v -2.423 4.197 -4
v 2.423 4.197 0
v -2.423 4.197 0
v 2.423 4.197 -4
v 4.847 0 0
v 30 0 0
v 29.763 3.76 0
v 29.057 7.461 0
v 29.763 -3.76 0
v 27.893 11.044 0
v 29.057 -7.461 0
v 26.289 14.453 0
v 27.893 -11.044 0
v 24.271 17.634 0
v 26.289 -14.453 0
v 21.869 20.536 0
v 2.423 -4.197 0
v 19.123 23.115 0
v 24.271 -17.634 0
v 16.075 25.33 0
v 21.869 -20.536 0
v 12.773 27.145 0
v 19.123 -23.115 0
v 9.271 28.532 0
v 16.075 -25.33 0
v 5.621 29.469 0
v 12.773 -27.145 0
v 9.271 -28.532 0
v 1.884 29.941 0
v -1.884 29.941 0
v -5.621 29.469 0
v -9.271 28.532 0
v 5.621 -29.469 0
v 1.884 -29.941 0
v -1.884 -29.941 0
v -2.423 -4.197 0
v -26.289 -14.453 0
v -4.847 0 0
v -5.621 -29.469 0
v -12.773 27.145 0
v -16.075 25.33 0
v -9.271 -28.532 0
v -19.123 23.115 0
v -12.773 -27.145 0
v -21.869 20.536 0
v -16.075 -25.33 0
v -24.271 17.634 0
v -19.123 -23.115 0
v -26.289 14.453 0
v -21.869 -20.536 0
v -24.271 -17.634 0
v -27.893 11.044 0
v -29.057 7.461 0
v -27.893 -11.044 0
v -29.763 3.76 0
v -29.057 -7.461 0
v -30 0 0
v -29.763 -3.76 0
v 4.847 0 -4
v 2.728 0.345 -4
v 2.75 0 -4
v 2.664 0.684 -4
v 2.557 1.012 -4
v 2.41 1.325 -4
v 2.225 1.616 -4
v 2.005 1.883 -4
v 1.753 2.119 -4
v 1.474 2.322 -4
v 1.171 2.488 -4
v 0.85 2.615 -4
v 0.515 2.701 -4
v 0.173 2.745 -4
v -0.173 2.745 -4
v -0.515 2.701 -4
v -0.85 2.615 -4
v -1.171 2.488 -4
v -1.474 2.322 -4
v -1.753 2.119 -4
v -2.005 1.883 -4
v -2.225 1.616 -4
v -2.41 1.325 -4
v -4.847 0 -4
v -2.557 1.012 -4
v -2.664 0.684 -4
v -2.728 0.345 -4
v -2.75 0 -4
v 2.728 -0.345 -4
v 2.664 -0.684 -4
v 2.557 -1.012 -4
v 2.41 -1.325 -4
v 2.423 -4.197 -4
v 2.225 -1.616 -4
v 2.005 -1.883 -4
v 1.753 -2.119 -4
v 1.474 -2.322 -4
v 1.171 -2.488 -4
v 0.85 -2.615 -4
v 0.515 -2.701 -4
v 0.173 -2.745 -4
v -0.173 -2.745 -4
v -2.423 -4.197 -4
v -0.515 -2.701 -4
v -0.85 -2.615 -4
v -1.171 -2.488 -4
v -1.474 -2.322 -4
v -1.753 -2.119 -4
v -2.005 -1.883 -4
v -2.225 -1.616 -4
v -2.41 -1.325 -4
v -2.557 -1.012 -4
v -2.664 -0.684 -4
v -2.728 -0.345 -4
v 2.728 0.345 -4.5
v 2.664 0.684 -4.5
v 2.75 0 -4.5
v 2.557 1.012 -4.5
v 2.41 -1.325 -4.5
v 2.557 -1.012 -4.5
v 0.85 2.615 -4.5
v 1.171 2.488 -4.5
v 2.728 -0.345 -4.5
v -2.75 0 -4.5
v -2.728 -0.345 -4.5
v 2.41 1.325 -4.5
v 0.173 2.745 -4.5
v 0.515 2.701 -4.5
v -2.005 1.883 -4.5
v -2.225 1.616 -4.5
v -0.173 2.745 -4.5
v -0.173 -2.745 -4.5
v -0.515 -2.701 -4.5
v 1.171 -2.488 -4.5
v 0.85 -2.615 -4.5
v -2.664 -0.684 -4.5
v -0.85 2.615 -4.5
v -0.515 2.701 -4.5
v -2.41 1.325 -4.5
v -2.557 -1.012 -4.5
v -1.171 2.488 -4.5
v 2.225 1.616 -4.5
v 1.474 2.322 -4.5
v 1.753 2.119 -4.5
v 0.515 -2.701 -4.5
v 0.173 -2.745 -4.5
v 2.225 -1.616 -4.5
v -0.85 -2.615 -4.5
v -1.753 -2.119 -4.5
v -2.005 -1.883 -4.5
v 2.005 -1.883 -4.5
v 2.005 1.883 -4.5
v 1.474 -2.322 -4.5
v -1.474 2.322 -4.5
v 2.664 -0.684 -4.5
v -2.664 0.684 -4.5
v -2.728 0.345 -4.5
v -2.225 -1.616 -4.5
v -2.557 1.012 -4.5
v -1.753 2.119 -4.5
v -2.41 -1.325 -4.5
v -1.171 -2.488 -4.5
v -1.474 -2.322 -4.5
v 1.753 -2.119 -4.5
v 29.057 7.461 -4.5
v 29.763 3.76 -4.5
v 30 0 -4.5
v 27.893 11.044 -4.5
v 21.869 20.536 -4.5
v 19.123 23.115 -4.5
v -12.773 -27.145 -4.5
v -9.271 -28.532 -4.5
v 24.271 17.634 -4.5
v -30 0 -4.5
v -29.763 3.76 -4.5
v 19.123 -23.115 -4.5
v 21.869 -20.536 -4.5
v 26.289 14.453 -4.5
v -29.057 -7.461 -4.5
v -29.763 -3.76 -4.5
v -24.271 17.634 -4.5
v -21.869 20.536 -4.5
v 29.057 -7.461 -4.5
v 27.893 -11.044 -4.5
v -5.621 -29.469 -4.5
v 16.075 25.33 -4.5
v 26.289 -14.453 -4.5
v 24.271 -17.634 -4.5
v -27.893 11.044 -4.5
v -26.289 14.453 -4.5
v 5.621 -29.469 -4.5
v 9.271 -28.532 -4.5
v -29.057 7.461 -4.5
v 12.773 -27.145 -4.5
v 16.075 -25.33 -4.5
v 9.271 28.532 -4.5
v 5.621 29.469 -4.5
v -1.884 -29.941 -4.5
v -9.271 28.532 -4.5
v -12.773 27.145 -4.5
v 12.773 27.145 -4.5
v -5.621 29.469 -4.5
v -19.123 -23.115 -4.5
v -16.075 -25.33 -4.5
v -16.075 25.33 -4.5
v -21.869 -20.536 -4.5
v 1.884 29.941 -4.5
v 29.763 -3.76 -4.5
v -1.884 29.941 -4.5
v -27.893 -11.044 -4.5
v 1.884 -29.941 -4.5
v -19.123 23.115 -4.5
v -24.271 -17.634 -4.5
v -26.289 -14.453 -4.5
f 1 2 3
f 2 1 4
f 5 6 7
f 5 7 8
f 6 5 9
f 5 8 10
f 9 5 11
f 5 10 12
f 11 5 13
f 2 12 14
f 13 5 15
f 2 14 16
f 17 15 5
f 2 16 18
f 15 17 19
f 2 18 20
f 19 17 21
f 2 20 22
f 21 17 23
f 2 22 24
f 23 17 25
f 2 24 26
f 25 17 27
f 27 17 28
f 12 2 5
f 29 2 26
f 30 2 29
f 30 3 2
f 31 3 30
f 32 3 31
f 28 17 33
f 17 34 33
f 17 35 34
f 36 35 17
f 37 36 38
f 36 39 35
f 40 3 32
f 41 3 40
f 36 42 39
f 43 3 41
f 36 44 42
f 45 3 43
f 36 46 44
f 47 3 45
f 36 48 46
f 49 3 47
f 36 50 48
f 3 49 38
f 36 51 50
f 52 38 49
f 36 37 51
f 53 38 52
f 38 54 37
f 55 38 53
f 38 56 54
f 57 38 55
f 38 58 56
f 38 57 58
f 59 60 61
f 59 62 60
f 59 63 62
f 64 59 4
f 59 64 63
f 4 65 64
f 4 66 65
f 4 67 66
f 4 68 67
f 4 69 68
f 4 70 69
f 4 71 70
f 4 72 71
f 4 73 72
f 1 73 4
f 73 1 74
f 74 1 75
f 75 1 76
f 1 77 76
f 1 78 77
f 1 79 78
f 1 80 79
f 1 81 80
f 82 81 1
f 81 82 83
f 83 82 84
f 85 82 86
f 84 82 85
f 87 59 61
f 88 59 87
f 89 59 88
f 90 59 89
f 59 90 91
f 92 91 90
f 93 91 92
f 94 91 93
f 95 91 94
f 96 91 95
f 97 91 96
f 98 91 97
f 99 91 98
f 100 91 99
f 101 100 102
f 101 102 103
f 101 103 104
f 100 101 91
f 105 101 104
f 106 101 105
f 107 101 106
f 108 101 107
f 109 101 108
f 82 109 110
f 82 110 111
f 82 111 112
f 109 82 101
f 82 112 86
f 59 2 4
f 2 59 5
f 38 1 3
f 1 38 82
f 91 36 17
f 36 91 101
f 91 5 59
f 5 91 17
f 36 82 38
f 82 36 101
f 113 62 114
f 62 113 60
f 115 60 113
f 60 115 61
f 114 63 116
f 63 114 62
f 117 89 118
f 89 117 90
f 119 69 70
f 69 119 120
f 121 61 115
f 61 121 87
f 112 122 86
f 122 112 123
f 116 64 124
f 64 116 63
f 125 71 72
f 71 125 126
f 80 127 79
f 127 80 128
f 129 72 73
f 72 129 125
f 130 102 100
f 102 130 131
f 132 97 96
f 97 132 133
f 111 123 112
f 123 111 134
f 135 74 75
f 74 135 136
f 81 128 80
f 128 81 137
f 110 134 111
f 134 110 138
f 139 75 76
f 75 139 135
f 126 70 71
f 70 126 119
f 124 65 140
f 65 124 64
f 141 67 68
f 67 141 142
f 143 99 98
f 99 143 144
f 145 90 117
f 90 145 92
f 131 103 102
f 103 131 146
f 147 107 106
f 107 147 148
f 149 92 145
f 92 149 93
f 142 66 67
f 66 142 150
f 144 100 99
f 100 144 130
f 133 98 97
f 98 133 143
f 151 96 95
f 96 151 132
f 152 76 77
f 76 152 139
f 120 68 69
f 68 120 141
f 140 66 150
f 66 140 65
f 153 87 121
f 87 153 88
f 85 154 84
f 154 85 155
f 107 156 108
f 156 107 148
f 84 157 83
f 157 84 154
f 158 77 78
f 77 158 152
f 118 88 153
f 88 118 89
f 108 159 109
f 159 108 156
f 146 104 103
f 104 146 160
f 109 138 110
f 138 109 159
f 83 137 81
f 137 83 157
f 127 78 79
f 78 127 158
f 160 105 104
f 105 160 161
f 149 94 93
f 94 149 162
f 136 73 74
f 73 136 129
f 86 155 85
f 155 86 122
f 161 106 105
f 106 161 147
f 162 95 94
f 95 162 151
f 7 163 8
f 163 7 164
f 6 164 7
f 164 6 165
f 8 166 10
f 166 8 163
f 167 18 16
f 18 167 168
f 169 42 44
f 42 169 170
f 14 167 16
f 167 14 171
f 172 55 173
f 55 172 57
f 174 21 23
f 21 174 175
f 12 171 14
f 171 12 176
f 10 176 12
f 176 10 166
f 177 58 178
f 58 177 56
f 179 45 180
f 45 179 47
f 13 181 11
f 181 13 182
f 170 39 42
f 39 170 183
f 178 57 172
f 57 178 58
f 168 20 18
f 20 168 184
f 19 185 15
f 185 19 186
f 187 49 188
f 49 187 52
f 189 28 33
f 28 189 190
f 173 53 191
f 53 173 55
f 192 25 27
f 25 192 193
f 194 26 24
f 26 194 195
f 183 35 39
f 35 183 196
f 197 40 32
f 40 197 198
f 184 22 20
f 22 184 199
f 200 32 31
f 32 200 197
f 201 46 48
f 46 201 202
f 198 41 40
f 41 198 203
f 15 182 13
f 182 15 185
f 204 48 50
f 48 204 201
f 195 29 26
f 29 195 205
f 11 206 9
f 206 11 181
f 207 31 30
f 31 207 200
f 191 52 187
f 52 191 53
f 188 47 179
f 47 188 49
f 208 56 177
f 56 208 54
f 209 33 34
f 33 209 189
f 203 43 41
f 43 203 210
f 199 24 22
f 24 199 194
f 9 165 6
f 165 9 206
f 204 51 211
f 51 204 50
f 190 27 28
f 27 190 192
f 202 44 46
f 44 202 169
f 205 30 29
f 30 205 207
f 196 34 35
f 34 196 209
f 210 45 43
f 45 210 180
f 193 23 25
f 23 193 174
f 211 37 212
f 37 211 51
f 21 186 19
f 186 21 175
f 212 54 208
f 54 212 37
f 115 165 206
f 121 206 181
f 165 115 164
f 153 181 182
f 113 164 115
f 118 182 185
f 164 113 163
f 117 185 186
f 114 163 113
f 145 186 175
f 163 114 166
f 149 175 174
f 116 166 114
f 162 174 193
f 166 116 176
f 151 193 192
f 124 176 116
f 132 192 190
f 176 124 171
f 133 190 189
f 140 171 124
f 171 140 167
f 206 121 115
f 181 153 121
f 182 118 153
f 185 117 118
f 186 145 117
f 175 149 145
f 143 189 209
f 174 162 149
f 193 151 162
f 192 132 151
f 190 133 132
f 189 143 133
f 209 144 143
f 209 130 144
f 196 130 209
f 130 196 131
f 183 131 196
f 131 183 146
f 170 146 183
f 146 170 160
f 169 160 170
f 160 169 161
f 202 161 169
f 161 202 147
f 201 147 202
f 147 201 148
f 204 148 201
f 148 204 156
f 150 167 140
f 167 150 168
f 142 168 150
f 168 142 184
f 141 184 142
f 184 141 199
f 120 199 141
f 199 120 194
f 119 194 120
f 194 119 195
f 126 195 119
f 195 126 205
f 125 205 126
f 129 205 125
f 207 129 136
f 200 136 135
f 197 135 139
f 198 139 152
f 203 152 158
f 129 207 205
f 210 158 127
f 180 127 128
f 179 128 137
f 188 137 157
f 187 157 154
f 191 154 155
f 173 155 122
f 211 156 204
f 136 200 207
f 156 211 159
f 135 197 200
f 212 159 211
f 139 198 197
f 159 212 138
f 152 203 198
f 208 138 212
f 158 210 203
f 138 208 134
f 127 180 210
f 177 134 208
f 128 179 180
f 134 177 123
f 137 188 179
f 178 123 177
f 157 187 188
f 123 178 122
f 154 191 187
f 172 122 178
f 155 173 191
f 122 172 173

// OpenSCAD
$fn = 50;

difference() {
	union() {
		translate(v = [0, 0, -4.5]) {
			cylinder(h = 4.5, r = 30.0);
		}
	}
	union() {
		translate(v = [0, 0, 0]) {
			rotate(a = [0, 0, 0]) {
				difference() {
					union() {
						translate(v = [0, 0, -4]) {
							linear_extrude(height = 4) {
								polygon(points = [[4.8468, 0.0], [2.4234000000000004, 4.197451927062417], [-2.423399999999999, 4.197451927062417], [-4.8468, 5.935618106107392e-16], [-2.423400000000002, -4.197451927062416], [2.423399999999997, -4.197451927062419]]);
							}
						}
					}
					union();
				}
			}
		}
		#translate(v = [0, 0, -100.0]) {
			cylinder(h = 200, r = 2.75);
		}
	}
}
